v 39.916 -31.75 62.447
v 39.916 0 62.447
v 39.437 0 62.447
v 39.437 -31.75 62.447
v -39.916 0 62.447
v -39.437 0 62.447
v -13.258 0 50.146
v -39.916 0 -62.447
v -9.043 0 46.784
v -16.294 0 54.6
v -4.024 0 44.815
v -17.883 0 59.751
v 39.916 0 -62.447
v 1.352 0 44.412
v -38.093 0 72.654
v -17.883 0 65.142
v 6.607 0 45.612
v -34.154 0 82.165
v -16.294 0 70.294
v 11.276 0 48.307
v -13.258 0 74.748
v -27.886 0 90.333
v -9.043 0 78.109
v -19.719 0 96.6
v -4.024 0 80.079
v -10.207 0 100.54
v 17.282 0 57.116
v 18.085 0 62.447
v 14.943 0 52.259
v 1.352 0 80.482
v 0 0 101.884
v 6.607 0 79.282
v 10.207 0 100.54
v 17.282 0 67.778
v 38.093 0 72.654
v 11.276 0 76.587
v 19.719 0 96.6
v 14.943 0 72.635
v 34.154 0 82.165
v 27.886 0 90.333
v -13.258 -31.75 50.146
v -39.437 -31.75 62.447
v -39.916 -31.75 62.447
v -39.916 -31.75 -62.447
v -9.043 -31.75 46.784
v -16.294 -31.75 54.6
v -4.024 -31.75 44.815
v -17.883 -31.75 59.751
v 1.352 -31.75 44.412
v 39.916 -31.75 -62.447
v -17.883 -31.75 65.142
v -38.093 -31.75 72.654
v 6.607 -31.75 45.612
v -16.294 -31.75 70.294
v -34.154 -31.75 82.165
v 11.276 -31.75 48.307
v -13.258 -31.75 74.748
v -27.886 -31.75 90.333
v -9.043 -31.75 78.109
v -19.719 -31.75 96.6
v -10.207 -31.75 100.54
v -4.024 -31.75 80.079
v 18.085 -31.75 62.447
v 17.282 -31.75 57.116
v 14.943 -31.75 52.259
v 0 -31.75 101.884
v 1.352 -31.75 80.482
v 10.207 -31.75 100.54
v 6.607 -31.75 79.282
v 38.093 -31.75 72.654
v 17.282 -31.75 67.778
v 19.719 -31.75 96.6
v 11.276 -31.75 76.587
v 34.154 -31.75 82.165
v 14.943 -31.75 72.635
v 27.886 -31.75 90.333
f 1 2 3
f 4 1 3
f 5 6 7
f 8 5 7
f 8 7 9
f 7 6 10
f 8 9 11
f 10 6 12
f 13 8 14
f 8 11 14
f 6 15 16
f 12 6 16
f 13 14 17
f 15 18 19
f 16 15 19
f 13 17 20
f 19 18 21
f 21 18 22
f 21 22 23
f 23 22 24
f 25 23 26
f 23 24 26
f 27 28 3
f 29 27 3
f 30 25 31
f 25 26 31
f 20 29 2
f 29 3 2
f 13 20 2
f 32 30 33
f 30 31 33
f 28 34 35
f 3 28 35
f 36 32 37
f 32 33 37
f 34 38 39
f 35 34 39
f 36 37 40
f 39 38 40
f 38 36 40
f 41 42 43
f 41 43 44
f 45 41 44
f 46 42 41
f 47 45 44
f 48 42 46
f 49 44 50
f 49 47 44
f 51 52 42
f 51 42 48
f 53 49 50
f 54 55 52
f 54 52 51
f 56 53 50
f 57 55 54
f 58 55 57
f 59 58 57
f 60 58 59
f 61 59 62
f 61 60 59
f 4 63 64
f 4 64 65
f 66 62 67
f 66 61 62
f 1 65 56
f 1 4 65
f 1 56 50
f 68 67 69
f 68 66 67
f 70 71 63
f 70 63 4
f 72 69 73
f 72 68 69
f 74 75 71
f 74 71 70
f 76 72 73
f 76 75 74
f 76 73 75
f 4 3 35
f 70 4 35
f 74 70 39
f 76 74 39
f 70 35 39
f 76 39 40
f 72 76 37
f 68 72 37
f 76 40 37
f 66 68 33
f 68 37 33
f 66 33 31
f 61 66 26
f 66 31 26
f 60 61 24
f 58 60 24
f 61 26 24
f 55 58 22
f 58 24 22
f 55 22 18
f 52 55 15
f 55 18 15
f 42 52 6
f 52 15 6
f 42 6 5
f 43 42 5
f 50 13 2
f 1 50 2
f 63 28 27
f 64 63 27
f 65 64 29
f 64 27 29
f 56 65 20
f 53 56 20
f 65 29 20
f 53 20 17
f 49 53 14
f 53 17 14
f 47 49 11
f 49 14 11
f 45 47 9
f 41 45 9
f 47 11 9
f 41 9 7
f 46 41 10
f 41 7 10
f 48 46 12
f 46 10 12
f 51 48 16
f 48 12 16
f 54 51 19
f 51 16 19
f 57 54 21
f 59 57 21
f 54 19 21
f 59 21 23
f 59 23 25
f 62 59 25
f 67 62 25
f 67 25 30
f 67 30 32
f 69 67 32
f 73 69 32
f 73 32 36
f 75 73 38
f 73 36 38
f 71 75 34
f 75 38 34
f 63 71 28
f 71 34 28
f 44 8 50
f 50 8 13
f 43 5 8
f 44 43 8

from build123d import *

# Parameters (mm, degrees)
F1_DEPTH = 31.75


with BuildPart() as f1:
    # F0 (on Front) → F1 (new body)
    with BuildSketch(Plane.XZ):
        with BuildLine():
            Line((-39.437188, 62.446829), (-39.916299, 62.446829))
            Line((-39.916299, 62.446829), (-39.916299, -62.446829))
            Line((-39.916299, -62.446829), (39.916299, -62.446829))
            Line((39.916299, -62.446829), (39.916299, 62.446829))
            Line((39.916299, 62.446829), (39.437188, 62.446829))
            ThreePointArc((39.437188, 62.446829), (0, 101.884017), (-39.437188, 62.446829))
        make_face()
        with BuildLine():
            ThreePointArc((-18.085412, 62.446829), (0, 80.532241), (18.085412, 62.446829))
            ThreePointArc((18.085412, 62.446829), (0, 44.361417), (-18.085412, 62.446829))
        make_face(mode=Mode.SUBTRACT)
    extrude(amount=F1_DEPTH)


solid = f1.part
